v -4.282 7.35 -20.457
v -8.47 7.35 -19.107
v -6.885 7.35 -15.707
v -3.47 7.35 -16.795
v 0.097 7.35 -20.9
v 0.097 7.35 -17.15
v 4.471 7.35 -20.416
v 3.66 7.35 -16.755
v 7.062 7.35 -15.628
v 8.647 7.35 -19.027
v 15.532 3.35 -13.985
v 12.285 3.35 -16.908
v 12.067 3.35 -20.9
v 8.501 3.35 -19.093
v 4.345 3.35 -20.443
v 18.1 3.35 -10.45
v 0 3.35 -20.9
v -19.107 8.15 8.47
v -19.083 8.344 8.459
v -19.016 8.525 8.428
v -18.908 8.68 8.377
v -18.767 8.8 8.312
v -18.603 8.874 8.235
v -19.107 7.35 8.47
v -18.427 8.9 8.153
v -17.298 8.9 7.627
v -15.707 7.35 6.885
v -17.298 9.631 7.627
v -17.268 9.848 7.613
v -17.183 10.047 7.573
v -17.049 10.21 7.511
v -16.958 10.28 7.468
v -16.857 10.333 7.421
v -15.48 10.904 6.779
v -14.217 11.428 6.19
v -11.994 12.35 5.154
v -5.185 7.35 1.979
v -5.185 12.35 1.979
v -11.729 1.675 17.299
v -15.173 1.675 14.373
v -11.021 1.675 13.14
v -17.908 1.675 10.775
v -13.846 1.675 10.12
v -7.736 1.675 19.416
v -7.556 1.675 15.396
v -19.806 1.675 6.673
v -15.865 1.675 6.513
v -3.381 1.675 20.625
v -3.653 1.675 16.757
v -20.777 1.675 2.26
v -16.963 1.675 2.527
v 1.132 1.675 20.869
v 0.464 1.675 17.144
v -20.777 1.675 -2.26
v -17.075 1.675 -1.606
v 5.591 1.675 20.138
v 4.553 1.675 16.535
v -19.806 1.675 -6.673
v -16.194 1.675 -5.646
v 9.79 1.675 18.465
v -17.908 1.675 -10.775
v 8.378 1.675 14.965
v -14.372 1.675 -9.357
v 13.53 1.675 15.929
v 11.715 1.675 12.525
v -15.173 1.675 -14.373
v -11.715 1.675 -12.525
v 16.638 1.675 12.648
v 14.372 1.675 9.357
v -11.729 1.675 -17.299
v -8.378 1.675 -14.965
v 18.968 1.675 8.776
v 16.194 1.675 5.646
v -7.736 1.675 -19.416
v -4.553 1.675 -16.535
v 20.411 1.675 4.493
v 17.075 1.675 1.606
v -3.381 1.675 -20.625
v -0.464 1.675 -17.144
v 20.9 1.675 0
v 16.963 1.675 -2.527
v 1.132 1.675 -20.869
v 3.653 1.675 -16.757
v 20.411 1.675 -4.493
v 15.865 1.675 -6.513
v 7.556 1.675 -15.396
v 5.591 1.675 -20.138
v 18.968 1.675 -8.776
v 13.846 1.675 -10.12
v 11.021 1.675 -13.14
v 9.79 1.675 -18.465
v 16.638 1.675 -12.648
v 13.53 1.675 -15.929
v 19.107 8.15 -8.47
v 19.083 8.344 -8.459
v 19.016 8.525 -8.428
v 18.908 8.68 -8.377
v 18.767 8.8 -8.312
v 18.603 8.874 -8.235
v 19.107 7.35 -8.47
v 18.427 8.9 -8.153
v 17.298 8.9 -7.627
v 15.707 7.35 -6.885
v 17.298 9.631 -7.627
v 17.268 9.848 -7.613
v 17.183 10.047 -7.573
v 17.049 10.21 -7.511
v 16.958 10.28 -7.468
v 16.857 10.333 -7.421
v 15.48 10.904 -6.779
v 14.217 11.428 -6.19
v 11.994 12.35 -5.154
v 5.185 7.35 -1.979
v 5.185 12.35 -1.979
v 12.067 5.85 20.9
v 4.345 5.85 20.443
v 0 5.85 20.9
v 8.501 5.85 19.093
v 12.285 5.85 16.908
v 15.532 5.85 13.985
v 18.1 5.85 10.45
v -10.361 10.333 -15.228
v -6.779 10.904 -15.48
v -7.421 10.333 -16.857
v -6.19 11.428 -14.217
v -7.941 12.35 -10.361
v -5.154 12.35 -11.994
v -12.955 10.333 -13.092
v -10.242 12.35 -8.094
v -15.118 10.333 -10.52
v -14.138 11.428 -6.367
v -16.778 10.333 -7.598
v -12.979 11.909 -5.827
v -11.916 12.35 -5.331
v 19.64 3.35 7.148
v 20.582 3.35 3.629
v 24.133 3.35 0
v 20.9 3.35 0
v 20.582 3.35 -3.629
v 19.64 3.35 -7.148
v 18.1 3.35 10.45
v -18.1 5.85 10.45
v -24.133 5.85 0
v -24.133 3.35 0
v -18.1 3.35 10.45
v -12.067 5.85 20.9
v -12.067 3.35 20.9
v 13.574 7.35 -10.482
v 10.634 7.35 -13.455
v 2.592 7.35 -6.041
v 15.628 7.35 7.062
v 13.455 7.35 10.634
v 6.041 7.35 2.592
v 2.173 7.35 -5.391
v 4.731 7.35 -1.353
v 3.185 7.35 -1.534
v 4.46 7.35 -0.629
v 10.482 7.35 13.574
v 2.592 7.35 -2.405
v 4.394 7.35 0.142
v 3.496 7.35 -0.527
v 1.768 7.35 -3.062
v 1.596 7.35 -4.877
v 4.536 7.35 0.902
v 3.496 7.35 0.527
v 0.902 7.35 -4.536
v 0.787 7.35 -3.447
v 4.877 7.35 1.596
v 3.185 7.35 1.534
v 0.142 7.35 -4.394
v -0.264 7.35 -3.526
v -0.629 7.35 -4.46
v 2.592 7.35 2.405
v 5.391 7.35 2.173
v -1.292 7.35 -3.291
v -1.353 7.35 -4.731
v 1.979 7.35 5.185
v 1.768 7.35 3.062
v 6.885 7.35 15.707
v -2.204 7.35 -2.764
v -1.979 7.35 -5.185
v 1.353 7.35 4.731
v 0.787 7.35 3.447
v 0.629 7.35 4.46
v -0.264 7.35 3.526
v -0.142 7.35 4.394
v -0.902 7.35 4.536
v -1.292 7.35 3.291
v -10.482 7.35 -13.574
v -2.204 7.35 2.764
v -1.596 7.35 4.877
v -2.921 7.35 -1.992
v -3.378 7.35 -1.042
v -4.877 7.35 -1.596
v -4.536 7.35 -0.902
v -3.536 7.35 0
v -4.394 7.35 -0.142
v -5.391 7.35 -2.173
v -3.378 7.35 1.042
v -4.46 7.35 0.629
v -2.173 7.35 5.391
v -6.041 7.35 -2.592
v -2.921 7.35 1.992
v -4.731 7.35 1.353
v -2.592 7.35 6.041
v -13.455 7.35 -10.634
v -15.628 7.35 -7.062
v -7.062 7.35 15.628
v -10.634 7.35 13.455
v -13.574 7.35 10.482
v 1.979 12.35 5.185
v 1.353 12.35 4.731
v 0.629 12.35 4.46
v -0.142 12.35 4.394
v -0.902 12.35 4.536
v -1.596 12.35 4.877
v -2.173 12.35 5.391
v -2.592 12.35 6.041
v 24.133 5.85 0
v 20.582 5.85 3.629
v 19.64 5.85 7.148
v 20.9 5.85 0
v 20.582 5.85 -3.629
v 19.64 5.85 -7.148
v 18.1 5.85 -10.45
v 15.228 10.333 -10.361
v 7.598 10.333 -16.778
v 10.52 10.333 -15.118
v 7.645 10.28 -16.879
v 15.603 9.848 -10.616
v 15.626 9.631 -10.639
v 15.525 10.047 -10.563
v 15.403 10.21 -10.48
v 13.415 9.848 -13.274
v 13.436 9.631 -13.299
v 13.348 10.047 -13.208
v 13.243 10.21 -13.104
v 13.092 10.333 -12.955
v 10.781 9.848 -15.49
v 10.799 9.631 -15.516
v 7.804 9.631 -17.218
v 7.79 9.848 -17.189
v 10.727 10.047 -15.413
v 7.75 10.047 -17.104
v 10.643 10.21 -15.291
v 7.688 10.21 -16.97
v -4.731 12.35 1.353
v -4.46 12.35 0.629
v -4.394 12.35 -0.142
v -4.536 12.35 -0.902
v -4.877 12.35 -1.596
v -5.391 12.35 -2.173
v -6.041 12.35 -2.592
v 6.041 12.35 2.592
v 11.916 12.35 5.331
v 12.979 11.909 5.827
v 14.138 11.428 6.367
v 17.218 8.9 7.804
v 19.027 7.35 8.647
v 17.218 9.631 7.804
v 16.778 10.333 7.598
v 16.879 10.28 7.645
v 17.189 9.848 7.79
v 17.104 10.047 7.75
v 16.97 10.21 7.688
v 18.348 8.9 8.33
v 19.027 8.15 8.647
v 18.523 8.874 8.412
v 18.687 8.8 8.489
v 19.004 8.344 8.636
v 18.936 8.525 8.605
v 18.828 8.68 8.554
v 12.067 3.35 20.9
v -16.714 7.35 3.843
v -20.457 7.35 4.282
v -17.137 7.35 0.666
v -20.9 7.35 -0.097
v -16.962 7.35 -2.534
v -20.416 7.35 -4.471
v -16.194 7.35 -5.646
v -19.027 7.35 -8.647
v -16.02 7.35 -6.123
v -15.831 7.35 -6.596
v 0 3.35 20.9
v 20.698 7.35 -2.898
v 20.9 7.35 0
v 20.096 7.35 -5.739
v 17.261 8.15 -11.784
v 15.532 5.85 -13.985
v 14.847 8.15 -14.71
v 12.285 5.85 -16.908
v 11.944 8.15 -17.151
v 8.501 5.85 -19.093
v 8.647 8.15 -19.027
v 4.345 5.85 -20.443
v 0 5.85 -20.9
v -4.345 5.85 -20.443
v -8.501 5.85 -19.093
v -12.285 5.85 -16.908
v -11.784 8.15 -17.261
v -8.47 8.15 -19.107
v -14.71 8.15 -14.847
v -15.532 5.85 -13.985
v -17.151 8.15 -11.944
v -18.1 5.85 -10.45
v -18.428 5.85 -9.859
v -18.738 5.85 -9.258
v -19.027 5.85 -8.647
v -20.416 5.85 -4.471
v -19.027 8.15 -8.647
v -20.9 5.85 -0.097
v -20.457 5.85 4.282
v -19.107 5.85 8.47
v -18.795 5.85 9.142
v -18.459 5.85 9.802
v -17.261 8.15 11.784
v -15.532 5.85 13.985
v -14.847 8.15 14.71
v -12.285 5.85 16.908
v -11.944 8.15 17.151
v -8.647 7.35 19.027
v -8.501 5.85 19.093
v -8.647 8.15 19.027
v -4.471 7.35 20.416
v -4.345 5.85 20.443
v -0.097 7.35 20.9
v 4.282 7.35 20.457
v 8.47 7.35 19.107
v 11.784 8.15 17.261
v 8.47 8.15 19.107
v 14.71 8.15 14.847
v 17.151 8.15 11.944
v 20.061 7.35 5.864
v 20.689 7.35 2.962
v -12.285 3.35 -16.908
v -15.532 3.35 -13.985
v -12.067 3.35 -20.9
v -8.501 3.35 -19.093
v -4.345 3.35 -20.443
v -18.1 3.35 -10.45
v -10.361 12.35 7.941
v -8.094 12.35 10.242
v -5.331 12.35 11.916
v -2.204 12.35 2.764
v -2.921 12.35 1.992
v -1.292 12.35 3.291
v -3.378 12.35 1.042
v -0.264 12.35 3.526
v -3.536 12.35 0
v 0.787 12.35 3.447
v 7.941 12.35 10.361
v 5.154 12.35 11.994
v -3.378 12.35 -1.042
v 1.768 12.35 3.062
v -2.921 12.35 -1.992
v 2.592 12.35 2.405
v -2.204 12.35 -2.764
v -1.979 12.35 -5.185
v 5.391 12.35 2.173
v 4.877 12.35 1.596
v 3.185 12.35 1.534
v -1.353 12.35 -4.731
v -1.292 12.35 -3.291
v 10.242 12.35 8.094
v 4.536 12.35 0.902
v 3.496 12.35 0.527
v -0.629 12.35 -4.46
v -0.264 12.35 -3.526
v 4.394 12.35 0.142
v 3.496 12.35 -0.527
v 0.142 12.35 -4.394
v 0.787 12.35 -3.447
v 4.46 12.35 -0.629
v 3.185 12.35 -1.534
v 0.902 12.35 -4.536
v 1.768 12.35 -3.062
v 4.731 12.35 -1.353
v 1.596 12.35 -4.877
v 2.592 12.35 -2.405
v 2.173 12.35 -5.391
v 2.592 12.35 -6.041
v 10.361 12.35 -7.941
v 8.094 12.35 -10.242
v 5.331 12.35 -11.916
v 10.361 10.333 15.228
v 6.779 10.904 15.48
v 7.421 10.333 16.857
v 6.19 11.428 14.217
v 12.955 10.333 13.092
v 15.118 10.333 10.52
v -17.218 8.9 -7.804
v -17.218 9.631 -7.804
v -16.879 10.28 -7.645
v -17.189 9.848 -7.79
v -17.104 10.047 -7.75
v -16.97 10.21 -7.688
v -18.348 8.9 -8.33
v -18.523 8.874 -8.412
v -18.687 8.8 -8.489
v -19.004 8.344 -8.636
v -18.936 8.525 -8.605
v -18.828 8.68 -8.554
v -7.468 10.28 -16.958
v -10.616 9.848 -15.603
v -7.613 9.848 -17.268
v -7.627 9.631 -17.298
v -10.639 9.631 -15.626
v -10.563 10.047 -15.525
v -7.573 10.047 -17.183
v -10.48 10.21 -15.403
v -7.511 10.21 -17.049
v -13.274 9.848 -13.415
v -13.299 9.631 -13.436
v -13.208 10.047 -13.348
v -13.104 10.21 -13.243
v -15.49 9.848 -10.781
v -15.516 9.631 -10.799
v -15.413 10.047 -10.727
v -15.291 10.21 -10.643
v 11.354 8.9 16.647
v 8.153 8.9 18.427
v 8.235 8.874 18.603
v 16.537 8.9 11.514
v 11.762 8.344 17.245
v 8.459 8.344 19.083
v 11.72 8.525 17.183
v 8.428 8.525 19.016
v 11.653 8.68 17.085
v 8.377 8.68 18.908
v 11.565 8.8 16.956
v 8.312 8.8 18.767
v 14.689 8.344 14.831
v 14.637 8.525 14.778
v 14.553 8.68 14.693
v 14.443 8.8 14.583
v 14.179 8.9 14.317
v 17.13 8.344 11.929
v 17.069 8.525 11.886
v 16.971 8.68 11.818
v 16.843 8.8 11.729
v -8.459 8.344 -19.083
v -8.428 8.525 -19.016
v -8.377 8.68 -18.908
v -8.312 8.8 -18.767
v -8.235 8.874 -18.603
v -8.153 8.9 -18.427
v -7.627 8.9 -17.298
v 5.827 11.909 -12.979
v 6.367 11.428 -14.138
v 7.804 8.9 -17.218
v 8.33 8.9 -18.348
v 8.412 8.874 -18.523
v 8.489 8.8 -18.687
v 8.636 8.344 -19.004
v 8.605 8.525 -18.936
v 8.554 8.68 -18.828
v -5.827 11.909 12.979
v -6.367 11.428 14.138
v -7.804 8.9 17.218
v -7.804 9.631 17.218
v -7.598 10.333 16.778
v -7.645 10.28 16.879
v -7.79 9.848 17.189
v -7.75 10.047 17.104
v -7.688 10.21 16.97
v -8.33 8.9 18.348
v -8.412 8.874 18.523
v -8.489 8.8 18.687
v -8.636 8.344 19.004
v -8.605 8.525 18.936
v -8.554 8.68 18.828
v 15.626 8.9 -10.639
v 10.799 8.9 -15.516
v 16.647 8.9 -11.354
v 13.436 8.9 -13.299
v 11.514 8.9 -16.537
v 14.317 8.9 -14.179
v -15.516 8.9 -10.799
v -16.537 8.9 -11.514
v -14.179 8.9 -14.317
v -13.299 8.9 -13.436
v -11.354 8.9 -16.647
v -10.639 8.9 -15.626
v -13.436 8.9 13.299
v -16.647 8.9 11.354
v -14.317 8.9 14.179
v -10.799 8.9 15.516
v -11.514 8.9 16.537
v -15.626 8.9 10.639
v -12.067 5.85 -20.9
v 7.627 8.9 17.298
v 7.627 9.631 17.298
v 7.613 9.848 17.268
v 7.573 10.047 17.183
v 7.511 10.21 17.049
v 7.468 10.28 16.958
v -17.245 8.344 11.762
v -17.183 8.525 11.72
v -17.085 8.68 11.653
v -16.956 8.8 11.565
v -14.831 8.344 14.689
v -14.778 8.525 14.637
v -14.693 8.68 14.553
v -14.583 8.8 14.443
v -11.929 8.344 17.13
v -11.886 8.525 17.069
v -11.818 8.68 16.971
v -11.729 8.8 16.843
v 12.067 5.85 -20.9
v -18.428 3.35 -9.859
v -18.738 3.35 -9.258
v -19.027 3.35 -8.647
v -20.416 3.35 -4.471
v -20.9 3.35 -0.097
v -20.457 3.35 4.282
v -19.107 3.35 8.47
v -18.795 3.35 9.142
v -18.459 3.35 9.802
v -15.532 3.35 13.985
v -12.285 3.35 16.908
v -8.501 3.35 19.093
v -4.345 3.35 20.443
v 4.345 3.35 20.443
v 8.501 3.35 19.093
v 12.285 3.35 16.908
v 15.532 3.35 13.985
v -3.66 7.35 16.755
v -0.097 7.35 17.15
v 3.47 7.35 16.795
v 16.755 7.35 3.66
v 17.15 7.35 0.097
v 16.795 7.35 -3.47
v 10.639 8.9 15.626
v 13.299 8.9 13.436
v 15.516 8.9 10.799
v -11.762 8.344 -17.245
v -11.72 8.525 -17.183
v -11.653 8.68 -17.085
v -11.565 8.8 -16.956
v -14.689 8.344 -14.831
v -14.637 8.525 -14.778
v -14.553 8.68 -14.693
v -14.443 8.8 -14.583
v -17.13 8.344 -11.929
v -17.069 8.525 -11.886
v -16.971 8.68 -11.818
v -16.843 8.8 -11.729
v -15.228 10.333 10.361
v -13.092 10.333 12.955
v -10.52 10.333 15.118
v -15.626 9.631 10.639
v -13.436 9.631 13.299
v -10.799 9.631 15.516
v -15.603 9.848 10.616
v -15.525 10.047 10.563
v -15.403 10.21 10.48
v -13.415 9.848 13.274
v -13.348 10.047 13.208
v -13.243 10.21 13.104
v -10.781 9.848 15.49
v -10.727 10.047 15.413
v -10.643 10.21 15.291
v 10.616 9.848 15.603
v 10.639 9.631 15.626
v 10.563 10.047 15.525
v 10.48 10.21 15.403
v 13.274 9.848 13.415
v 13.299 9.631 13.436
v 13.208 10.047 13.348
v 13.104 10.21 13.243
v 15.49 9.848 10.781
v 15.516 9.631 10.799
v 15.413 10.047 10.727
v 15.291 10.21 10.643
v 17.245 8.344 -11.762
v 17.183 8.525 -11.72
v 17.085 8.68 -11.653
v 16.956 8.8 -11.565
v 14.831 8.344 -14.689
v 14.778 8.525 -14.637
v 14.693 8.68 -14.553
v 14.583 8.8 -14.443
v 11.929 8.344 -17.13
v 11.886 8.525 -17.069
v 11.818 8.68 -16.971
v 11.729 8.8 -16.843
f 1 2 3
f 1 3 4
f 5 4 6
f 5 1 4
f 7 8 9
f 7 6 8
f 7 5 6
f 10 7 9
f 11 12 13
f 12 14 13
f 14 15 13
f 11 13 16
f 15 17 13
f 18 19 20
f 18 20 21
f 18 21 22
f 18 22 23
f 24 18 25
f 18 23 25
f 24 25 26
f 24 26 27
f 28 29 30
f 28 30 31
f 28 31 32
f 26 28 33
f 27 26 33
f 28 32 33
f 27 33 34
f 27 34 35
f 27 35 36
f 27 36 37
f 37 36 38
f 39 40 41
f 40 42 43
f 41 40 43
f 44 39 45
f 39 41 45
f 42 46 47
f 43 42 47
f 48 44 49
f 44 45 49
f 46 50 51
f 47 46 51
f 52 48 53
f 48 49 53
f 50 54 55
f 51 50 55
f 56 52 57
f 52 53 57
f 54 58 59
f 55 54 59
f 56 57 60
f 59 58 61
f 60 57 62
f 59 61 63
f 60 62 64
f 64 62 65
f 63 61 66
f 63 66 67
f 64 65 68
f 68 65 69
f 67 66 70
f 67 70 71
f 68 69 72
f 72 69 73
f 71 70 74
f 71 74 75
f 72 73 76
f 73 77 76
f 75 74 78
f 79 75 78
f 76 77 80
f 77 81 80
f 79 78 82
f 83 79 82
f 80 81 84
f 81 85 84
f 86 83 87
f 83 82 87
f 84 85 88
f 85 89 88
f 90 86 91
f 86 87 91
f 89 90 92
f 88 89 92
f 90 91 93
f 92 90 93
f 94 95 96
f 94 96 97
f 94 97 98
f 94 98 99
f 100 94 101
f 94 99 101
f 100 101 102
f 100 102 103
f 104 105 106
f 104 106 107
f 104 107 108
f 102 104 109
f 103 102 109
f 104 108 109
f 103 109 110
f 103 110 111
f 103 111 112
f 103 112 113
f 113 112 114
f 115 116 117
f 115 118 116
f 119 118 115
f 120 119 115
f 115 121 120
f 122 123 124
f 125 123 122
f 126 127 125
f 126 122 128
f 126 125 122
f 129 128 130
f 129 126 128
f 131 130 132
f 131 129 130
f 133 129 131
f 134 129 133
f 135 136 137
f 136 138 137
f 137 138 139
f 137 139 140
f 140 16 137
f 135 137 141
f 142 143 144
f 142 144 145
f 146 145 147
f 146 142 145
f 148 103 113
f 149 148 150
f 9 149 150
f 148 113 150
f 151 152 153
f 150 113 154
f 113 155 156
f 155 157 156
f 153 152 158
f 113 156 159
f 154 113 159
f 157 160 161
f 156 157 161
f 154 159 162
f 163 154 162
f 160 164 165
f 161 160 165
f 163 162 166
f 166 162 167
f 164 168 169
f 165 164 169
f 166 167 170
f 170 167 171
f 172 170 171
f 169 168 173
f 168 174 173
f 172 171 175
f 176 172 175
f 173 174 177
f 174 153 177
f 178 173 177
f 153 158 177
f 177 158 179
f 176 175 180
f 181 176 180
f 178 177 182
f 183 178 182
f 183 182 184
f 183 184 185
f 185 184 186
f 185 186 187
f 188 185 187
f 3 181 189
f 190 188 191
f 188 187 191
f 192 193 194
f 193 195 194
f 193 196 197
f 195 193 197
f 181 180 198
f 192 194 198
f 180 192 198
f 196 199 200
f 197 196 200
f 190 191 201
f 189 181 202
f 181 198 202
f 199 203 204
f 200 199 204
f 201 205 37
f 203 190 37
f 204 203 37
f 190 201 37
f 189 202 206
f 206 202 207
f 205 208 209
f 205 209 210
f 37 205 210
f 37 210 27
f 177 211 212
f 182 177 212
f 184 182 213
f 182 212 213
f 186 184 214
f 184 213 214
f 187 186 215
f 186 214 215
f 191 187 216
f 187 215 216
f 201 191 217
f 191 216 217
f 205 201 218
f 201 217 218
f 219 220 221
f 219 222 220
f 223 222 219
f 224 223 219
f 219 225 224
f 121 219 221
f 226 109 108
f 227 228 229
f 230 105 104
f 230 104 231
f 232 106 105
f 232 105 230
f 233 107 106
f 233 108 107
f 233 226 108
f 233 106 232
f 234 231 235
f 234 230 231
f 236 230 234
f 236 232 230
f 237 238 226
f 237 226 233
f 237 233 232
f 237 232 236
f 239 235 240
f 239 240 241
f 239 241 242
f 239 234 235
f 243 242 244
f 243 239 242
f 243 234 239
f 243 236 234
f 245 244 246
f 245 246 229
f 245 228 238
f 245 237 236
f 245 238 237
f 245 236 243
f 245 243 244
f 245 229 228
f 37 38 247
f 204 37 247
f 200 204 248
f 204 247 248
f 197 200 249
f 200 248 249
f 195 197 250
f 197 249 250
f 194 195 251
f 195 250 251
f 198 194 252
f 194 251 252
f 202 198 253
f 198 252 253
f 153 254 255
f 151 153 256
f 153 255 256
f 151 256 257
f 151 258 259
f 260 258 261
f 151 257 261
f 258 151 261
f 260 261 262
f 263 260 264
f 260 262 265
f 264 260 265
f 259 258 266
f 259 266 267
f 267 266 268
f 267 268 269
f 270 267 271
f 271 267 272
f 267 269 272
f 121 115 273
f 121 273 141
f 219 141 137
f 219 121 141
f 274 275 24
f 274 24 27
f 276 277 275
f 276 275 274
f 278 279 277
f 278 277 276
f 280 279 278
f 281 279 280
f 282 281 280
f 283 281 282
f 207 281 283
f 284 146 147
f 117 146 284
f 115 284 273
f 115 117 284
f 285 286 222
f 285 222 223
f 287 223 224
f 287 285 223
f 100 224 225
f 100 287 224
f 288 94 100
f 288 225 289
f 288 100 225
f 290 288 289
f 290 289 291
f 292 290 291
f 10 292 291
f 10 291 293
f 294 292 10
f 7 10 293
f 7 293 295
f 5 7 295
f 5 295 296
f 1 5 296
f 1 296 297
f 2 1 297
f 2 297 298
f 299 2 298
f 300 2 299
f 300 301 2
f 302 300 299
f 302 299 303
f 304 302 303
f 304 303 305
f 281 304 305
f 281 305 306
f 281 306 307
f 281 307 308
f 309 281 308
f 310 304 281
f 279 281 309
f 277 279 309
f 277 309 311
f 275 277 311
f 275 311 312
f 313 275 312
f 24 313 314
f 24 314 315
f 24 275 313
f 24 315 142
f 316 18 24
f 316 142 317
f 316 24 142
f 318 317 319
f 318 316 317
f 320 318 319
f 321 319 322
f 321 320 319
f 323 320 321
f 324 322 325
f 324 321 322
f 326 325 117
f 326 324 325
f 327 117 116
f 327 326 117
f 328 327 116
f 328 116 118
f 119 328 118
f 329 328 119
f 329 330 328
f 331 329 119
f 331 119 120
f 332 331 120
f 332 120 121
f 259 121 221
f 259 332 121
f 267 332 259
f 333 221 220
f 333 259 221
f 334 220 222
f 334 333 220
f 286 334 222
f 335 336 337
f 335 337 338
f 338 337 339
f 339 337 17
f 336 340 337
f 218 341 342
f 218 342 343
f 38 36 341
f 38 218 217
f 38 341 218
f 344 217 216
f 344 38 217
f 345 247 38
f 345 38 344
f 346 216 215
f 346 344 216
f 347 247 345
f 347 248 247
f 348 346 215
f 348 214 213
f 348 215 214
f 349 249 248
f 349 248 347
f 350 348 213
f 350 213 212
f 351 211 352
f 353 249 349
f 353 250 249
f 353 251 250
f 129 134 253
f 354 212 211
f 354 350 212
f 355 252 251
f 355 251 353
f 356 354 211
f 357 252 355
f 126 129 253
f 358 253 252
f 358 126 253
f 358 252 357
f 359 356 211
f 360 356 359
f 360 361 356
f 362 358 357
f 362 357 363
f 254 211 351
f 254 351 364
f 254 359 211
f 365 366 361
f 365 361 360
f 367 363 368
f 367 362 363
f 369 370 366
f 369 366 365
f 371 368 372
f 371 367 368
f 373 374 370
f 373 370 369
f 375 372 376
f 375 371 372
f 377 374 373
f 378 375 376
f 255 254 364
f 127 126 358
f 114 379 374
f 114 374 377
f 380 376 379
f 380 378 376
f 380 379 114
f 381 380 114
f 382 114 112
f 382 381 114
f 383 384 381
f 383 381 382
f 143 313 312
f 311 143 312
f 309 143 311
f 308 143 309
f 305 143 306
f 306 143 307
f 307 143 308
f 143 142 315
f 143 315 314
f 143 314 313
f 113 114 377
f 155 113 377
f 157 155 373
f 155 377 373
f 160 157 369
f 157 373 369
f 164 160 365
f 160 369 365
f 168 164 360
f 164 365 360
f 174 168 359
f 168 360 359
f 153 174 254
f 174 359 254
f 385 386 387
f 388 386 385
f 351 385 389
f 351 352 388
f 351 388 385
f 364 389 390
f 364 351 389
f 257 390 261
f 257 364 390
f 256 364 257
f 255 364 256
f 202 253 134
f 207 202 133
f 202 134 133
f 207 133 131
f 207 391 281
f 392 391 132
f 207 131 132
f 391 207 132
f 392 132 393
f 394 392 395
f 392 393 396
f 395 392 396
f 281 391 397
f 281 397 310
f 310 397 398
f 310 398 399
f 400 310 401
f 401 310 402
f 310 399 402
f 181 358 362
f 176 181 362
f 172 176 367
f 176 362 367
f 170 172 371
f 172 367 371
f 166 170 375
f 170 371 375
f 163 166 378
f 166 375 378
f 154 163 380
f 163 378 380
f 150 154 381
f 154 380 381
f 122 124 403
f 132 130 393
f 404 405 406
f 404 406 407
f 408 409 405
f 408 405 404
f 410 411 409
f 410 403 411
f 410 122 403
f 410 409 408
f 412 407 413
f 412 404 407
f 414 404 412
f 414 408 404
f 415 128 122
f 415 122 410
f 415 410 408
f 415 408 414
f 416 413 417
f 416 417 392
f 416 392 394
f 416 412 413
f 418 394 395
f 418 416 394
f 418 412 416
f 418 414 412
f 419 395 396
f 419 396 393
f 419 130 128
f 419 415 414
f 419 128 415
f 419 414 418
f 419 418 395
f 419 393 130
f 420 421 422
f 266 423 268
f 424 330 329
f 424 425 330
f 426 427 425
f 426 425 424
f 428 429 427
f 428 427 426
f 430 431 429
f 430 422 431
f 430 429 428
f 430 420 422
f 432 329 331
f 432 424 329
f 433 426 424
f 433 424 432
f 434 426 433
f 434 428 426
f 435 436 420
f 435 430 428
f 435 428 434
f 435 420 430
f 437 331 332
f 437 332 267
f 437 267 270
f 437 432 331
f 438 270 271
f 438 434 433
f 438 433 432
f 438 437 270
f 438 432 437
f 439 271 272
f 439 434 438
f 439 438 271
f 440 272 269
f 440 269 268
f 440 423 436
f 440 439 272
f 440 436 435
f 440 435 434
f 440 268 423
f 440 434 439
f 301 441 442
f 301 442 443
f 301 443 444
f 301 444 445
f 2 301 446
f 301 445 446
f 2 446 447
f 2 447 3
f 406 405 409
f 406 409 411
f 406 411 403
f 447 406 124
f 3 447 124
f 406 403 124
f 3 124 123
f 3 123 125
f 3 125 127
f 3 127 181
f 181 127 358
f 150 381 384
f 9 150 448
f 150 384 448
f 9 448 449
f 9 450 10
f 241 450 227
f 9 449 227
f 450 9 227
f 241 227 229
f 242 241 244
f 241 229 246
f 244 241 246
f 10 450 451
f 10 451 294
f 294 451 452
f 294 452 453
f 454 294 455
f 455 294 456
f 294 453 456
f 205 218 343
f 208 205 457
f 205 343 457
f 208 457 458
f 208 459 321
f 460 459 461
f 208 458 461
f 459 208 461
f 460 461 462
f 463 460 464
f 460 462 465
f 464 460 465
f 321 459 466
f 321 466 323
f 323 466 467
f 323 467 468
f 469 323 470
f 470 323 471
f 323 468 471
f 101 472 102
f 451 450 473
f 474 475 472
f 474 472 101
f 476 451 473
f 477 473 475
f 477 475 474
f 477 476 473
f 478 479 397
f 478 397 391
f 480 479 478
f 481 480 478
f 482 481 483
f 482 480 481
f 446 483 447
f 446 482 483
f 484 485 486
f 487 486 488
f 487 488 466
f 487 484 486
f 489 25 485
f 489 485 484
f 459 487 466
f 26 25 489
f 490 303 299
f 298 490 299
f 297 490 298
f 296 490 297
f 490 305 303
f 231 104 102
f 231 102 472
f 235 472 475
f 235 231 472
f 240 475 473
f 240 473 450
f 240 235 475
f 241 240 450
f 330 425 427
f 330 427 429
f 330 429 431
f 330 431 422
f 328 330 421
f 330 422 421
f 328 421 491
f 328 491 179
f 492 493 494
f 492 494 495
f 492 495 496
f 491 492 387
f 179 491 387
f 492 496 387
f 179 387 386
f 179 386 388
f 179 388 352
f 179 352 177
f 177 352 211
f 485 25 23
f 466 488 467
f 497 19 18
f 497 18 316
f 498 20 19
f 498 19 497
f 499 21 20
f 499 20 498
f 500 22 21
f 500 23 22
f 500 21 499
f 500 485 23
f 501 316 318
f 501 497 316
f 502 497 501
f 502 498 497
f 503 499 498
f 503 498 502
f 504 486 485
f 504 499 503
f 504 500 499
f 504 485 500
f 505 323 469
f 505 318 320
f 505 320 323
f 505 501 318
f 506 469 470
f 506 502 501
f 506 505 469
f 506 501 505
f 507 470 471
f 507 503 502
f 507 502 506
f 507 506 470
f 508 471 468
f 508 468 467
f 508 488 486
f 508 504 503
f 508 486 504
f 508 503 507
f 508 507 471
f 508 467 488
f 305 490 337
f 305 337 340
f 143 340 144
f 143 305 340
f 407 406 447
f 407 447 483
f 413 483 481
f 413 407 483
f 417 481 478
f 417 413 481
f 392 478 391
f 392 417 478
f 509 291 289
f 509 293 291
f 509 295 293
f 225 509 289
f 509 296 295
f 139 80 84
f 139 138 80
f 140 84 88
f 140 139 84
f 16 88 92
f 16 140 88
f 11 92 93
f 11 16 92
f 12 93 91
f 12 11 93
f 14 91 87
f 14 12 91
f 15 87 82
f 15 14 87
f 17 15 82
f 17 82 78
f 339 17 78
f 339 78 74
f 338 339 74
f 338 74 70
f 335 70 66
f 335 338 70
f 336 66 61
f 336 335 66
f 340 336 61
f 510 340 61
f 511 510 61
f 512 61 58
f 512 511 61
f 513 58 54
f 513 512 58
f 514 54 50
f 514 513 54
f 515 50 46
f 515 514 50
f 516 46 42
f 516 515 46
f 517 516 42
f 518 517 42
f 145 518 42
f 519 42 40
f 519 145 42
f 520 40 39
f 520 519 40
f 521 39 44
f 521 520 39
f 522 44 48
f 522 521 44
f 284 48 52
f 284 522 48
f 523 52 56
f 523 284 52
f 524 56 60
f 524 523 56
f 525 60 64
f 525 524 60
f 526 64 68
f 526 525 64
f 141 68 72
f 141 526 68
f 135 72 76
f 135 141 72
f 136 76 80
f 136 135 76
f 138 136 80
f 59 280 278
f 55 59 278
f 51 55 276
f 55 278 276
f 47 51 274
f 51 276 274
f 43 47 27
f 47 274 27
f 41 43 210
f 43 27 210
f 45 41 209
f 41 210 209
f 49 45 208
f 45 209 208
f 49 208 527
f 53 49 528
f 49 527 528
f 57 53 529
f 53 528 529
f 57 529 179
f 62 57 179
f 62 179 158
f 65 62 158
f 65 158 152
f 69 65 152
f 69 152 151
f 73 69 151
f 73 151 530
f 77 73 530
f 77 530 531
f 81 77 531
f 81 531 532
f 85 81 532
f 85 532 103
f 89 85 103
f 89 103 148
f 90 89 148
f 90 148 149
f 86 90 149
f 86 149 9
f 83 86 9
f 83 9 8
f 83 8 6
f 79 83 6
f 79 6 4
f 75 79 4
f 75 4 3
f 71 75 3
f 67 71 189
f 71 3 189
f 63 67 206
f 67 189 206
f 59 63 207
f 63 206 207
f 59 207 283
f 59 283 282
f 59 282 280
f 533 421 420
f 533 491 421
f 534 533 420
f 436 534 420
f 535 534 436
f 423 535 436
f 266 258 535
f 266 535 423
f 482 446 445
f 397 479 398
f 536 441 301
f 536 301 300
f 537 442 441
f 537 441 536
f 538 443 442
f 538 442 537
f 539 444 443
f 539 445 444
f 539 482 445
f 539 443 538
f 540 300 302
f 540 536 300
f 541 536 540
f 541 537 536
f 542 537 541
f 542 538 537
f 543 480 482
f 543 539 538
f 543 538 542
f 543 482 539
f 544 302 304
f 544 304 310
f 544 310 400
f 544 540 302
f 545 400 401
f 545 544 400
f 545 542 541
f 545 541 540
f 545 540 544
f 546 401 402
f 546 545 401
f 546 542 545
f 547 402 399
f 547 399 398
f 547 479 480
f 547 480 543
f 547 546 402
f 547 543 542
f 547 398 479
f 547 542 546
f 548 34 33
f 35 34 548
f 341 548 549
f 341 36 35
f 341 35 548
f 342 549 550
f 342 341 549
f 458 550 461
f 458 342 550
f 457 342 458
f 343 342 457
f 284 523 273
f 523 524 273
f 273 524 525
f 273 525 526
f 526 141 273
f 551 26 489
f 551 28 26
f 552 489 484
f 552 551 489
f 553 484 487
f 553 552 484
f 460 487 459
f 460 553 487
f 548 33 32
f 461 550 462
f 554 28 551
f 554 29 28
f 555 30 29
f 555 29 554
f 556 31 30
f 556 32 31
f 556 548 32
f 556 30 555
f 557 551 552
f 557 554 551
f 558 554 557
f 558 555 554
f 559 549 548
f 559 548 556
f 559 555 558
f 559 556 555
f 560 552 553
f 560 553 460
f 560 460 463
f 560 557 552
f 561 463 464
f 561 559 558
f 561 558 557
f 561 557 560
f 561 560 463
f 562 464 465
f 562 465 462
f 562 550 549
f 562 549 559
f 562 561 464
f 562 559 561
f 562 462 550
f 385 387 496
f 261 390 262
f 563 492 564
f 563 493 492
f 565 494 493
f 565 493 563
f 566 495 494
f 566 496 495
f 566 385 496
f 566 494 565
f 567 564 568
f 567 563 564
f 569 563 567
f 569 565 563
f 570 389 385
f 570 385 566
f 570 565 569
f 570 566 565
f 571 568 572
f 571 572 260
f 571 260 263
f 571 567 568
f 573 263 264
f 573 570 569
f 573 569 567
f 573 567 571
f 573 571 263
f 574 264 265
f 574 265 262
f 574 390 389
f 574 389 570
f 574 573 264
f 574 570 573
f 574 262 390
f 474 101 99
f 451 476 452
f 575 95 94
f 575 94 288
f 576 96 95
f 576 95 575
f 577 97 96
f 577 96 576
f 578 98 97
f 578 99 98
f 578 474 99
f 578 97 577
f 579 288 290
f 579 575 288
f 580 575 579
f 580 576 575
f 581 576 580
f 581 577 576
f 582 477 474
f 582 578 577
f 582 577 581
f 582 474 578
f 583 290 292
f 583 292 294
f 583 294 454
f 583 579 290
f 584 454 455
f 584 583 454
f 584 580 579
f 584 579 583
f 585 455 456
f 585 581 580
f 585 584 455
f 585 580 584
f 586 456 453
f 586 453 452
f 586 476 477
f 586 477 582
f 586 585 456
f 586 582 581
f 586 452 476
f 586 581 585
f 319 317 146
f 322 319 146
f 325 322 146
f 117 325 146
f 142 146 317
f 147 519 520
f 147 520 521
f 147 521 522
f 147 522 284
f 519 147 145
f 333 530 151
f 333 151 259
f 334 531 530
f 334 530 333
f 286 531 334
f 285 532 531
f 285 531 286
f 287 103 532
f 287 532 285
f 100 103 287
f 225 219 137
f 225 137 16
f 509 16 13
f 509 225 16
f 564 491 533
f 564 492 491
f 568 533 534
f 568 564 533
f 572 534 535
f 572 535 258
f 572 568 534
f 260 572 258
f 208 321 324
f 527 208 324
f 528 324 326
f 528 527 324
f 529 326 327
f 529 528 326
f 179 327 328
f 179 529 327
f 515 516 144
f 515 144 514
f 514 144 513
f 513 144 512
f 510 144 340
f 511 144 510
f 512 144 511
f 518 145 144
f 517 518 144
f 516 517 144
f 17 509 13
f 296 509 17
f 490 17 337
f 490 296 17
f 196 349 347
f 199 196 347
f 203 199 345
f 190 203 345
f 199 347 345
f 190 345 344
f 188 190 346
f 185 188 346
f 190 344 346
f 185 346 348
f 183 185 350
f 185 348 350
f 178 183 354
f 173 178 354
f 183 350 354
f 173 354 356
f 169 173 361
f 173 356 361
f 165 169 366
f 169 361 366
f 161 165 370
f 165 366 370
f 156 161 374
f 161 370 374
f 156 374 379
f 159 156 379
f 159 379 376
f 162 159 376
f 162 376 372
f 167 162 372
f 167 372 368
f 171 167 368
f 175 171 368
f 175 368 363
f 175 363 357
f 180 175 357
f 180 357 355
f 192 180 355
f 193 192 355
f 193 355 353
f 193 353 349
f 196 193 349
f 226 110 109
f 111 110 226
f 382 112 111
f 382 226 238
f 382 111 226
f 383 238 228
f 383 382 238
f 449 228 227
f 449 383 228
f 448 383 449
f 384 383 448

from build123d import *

# Parameters (mm, degrees)
CUT_EXTRUDE1_DEPTH  = 5
CUT_EXTRUDE2_START  = -2.5
CUT_EXTRUDE2_DEPTH  = 2.5
CUT_EXTRUDE3_START  = -5
SKETCH2_3_R         = 17.15
CUT_EXTRUDE3_DEPTH  = 17.2
SKETCH2_4_R         = 3.535533906
CUT_EXTRUDE4_DEPTH  = 39.518956436
BOSS_EXTRUDE1_START = -1.5
BOSS_EXTRUDE1_DEPTH = 2.5


with BuildPart() as part:
    # Sketch1 → Revolve1 (revolve)
    with BuildSketch(Plane.XY, mode=Mode.PRIVATE) as revolve1_sk:
        with BuildLine():
            Line((0, 12.35), (0, -12.35))
            Line((0, -12.35), (-18.904240623, -12.35))
            ThreePointArc((-18.904240623, -12.35), (-19.434570709, -12.130330086), (-19.654240623, -11.6))
            Line((-19.654240623, -11.6), (-19.654240623, -11.1))
            Line((-19.654240623, -11.1), (-20.9, -11.1))
            Line((-20.9, -11.1), (-20.9, 8.15))
            ThreePointArc((-20.9, 8.15), (-20.680330086, 8.680330086), (-20.15, 8.9))
            Line((-20.15, 8.9), (-18.904240623, 8.9))
            Line((-18.904240623, 8.9), (-18.904240623, 9.630769231))
            ThreePointArc((-18.904240623, 9.630769231), (-18.770884767, 10.057676715), (-18.418240623, 10.332769231))
            Line((-18.418240623, 10.332769231), (-13.054240623, 12.35))
            Line((-13.054240623, 12.35), (0, 12.35))
        make_face()
    revolve(revolve1_sk.sketch.rotate(Axis((0, -1000, 0), (0, 1, 0)), 180), axis=Axis((0, -1000, 0), (0, 1, 0)))

    # Sketch2 → Cut-Extrude1 (cut)
    with BuildSketch(Plane(origin=(0, 12.35, 0), x_dir=(1, 0, 0), z_dir=(0, 1, 0))):
        with BuildLine():
            Line((-8.470268029, 19.1066627), (-1.978678793, 5.185404659))
            ThreePointArc((-1.978678793, 5.185404659), (0.526465099, 4.43920684), (2.591742961, 6.041450409))
            Line((2.591742961, 6.041450409), (8.647131476, 19.027272985))
            ThreePointArc((8.647131476, 19.027272985), (0.0969322, 20.899775218), (-8.470268029, 19.1066627))
        make_face()
        with BuildLine():
            Line((19.1066627, 8.470268029), (5.185404659, 1.978678793))
            ThreePointArc((5.185404659, 1.978678793), (4.43920684, -0.526465099), (6.041450409, -2.591742961))
            Line((6.041450409, -2.591742961), (19.027272985, -8.647131476))
            ThreePointArc((19.027272985, -8.647131476), (20.899775218, -0.0969322), (19.1066627, 8.470268029))
        make_face()
        with BuildLine():
            Line((8.470268029, -19.1066627), (1.978678793, -5.185404659))
            ThreePointArc((1.978678793, -5.185404659), (-0.526465099, -4.43920684), (-2.591742961, -6.041450409))
            Line((-2.591742961, -6.041450409), (-8.647131476, -19.027272985))
            ThreePointArc((-8.647131476, -19.027272985), (-0.0969322, -20.899775218), (8.470268029, -19.1066627))
        make_face()
        with BuildLine():
            Line((-19.1066627, -8.470268029), (-5.185404659, -1.978678793))
            ThreePointArc((-5.185404659, -1.978678793), (-4.43920684, 0.526465099), (-6.041450409, 2.591742961))
            Line((-6.041450409, 2.591742961), (-19.027272985, 8.647131476))
            ThreePointArc((-19.027272985, 8.647131476), (-20.899775218, 0.0969322), (-19.1066627, -8.470268029))
        make_face()
    extrude(amount=-CUT_EXTRUDE1_DEPTH, mode=Mode.SUBTRACT)

    # Sketch4 → Cut-Extrude2 (cut)
    with BuildSketch(Plane.XZ.offset(12.35).offset(CUT_EXTRUDE2_START)):
        with BuildLine():
            Line((19.750543614, 6.835643858), (6.391971098, 2.365928018))
            ThreePointArc((6.391971098, 2.365928018), (4.733487025, -0.031487028), (6.451436213, -2.386655581))
            Line((6.451436213, -2.386655581), (19.750285899, -6.836388441))
            ThreePointArc((19.750285899, -6.836388441), (20.899999996, -0.000393961), (19.750543614, 6.835643858))
        make_face()
        with BuildLine():
            Line((-6.835643858, 19.750543614), (-2.365928018, 6.391971098))
            ThreePointArc((-2.365928018, 6.391971098), (0.031487028, 4.733487025), (2.386655581, 6.451436213))
            Line((2.386655581, 6.451436213), (6.836388441, 19.750285899))
            ThreePointArc((6.836388441, 19.750285899), (0.000393961, 20.899999996), (-6.835643858, 19.750543614))
        make_face()
        with BuildLine():
            Line((6.835643858, -19.750543614), (2.365928018, -6.391971098))
            ThreePointArc((2.365928018, -6.391971098), (-0.031487028, -4.733487025), (-2.386655581, -6.451436213))
            Line((-2.386655581, -6.451436213), (-6.836388441, -19.750285899))
            ThreePointArc((-6.836388441, -19.750285899), (-0.000393961, -20.899999996), (6.835643858, -19.750543614))
        make_face()
        with BuildLine():
            Line((-19.750543614, -6.835643858), (-6.391971098, -2.365928018))
            ThreePointArc((-6.391971098, -2.365928018), (-4.733487025, 0.031487028), (-6.451436213, 2.386655581))
            Line((-6.451436213, 2.386655581), (-19.750285899, 6.836388441))
            ThreePointArc((-19.750285899, 6.836388441), (-20.899999996, 0.000393961), (-19.750543614, -6.835643858))
        make_face()
    extrude(amount=CUT_EXTRUDE2_DEPTH, mode=Mode.SUBTRACT)

    # Sketch2<3> → Cut-Extrude3 (cut)
    with BuildSketch(Plane(origin=(0, 12.35, 0), x_dir=(1, 0, 0), z_dir=(0, 1, 0)).offset(CUT_EXTRUDE3_START)):
        with Locations(Location((0, 0, 0), (0, 0, 160.780147913))):
            Circle(SKETCH2_3_R)
    extrude(amount=-CUT_EXTRUDE3_DEPTH, mode=Mode.SUBTRACT)

    # Sketch2<4> → Cut-Extrude4 (cut, through all)
    with BuildSketch(Plane(origin=(0, 12.35, 0), x_dir=(1, 0, 0), z_dir=(0, 1, 0))):
        with Locations(Location((0, 0, 0), (0, 0, 180))):
            Circle(SKETCH2_4_R)
    extrude(amount=-CUT_EXTRUDE4_DEPTH, mode=Mode.SUBTRACT)

    # Sketch5 → Boss-Extrude1 (add)
    with BuildSketch(Plane(origin=(0, 7.35, 0), x_dir=(1, 0, 0), z_dir=(0, 1, 0)).offset(BOSS_EXTRUDE1_START)):
        Polygon((12.066620626, 20.9), (-12.066620626, 20.9), (-24.133241252, 0), (-12.066620626, -20.9), (12.066620626, -20.9), (24.133241252, 0), align=None)
        with BuildLine():
            ThreePointArc((-19.1066627, -8.470268029), (-20.899775218, 0.0969322), (-19.027272985, 8.647131476))
            Line((-19.027272985, 8.647131476), (-17.078607454, 7.738453815))
            ThreePointArc((-17.078607454, 7.738453815), (3.958447312, 18.3273892), (18.75, 0))
            ThreePointArc((18.75, 0), (3.863644604, -18.347608846), (-17.157706707, -7.561454924))
            Line((-17.157706707, -7.561454924), (-19.1066627, -8.470268029))
        make_face(mode=Mode.SUBTRACT)
    extrude(amount=-BOSS_EXTRUDE1_DEPTH)

    # SurfaceCut1
    split(bisect_by=Plane(origin=(0, 1.675, 0), x_dir=(1, 0, 0), z_dir=(0, 1, 0)), keep=Keep.TOP)


solid = part.part
